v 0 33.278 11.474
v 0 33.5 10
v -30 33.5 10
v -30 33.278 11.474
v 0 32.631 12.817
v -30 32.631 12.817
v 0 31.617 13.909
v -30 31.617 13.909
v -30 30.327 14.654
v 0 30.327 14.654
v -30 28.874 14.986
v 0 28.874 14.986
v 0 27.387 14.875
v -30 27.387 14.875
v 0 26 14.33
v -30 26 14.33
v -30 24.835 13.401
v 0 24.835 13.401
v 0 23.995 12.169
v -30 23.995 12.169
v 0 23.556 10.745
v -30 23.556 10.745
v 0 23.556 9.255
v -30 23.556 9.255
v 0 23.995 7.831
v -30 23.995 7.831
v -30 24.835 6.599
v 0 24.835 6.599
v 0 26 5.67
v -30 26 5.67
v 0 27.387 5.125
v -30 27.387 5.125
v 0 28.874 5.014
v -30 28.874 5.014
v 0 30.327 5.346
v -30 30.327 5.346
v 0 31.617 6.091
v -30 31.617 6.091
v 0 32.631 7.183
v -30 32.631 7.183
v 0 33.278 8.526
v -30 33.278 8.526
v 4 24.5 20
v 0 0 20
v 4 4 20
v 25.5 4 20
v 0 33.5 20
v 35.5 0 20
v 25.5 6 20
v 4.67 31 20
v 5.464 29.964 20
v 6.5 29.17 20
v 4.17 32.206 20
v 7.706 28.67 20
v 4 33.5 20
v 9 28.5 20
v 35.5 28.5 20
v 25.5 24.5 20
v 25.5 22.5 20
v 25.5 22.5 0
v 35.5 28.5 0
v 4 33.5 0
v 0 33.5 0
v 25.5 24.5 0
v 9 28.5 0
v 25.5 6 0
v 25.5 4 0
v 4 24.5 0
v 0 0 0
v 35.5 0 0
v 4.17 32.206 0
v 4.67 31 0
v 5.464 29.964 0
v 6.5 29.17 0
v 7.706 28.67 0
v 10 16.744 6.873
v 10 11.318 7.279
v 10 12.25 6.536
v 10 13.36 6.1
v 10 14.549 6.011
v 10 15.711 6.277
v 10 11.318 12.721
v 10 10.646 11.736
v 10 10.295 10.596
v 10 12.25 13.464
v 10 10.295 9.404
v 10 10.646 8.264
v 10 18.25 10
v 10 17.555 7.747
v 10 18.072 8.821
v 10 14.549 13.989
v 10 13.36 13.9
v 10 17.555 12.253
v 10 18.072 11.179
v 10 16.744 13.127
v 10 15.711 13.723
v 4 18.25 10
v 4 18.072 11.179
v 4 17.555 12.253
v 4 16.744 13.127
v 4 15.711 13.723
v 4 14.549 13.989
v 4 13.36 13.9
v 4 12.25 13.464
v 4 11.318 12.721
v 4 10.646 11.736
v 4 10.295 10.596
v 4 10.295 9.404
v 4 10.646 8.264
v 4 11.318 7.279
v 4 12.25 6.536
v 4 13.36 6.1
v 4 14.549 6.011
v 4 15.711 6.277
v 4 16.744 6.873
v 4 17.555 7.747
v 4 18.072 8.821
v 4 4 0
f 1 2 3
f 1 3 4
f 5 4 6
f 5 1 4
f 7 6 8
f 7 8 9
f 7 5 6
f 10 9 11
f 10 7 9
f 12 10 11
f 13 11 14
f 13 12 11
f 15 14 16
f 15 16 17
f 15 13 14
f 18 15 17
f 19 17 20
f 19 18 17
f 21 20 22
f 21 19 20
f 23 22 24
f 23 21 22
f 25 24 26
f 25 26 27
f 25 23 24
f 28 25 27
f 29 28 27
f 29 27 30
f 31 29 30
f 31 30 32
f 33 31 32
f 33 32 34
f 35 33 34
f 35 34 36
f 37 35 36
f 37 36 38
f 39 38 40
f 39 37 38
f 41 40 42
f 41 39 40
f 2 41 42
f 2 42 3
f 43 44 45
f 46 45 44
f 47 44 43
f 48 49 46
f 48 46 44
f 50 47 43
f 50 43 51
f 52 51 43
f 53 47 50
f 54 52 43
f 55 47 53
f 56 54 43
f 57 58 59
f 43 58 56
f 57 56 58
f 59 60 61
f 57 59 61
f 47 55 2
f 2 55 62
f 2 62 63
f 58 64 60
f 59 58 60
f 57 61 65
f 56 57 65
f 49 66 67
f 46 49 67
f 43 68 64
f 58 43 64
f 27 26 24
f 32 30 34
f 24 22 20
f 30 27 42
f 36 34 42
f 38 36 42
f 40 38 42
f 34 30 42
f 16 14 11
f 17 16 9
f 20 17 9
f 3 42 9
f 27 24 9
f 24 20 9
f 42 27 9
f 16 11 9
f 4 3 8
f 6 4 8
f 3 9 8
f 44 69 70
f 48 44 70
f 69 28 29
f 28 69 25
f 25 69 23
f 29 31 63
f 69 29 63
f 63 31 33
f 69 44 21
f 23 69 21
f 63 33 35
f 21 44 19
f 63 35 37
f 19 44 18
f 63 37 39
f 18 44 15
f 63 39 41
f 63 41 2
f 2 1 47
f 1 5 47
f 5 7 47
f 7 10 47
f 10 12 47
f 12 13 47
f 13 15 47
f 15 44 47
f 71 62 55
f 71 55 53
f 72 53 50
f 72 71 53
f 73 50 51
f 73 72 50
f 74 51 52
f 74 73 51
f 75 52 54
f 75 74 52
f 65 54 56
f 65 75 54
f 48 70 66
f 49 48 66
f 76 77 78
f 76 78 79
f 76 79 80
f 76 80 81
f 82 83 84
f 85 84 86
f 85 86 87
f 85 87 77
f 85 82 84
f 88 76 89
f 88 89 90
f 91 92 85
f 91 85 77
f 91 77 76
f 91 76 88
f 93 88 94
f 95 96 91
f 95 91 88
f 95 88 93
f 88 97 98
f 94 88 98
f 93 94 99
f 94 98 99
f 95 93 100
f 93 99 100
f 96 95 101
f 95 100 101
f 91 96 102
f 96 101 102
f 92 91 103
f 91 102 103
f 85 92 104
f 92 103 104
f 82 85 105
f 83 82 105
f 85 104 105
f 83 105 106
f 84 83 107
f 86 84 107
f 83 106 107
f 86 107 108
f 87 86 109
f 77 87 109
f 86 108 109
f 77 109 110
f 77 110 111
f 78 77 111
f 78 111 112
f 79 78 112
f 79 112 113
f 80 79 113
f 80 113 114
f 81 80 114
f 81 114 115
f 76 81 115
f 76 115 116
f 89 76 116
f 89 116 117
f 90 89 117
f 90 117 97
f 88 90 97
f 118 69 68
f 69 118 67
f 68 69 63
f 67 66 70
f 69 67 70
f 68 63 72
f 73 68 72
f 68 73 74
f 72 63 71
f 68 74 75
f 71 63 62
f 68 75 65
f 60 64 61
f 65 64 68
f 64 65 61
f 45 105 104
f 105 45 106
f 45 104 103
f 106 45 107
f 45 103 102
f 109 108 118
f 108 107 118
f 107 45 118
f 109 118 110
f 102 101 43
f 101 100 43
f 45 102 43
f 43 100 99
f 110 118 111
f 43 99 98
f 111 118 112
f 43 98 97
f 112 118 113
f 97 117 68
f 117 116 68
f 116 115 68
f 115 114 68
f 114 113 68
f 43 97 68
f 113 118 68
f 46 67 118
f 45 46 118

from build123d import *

# Parameters (mm, degrees)
PAD_DEPTH    = 20
PAD003_DEPTH = 20
SKETCH001_R  = 5
PAD004_DEPTH = 30
SKETCH003_R  = 4
PAD005_DEPTH = 10


with BuildPart() as part:
    # Sketch → Pad (new body)
    with BuildSketch(Plane.XY):
        Polygon((0, 0), (35.5, 0), (25.5, 6), (25.5, 4), (4, 4), (4, 24.5), (25.5, 24.5), (25.5, 22.5), (35.5, 28.5), (0, 28.5), align=None)
    extrude(amount=PAD_DEPTH)

    # Sketch002 → Pad003 (join)
    with BuildSketch(Plane.XY):
        with BuildLine():
            Line((0, 33.5), (0, 28.5))
            Line((0, 28.5), (4, 28.5))
            Line((4, 28.5), (9.000029, 28.5))
            ThreePointArc((4, 33.5), (5.464476, 29.964456), (9.000029, 28.5))
            Line((4, 33.5), (0, 33.5))
        make_face()
    extrude(amount=PAD003_DEPTH)

    # Sketch001 → Pad004 (join)
    with BuildSketch(Plane.YZ):
        with Locations((28.5, 10)):
            Circle(SKETCH001_R)
    extrude(amount=-PAD004_DEPTH)

    # Sketch003 → Pad005 (join)
    with BuildSketch(Plane.YZ):
        with Locations((14.25, 10)):
            Circle(SKETCH003_R)
    extrude(amount=PAD005_DEPTH)


solid = part.part
